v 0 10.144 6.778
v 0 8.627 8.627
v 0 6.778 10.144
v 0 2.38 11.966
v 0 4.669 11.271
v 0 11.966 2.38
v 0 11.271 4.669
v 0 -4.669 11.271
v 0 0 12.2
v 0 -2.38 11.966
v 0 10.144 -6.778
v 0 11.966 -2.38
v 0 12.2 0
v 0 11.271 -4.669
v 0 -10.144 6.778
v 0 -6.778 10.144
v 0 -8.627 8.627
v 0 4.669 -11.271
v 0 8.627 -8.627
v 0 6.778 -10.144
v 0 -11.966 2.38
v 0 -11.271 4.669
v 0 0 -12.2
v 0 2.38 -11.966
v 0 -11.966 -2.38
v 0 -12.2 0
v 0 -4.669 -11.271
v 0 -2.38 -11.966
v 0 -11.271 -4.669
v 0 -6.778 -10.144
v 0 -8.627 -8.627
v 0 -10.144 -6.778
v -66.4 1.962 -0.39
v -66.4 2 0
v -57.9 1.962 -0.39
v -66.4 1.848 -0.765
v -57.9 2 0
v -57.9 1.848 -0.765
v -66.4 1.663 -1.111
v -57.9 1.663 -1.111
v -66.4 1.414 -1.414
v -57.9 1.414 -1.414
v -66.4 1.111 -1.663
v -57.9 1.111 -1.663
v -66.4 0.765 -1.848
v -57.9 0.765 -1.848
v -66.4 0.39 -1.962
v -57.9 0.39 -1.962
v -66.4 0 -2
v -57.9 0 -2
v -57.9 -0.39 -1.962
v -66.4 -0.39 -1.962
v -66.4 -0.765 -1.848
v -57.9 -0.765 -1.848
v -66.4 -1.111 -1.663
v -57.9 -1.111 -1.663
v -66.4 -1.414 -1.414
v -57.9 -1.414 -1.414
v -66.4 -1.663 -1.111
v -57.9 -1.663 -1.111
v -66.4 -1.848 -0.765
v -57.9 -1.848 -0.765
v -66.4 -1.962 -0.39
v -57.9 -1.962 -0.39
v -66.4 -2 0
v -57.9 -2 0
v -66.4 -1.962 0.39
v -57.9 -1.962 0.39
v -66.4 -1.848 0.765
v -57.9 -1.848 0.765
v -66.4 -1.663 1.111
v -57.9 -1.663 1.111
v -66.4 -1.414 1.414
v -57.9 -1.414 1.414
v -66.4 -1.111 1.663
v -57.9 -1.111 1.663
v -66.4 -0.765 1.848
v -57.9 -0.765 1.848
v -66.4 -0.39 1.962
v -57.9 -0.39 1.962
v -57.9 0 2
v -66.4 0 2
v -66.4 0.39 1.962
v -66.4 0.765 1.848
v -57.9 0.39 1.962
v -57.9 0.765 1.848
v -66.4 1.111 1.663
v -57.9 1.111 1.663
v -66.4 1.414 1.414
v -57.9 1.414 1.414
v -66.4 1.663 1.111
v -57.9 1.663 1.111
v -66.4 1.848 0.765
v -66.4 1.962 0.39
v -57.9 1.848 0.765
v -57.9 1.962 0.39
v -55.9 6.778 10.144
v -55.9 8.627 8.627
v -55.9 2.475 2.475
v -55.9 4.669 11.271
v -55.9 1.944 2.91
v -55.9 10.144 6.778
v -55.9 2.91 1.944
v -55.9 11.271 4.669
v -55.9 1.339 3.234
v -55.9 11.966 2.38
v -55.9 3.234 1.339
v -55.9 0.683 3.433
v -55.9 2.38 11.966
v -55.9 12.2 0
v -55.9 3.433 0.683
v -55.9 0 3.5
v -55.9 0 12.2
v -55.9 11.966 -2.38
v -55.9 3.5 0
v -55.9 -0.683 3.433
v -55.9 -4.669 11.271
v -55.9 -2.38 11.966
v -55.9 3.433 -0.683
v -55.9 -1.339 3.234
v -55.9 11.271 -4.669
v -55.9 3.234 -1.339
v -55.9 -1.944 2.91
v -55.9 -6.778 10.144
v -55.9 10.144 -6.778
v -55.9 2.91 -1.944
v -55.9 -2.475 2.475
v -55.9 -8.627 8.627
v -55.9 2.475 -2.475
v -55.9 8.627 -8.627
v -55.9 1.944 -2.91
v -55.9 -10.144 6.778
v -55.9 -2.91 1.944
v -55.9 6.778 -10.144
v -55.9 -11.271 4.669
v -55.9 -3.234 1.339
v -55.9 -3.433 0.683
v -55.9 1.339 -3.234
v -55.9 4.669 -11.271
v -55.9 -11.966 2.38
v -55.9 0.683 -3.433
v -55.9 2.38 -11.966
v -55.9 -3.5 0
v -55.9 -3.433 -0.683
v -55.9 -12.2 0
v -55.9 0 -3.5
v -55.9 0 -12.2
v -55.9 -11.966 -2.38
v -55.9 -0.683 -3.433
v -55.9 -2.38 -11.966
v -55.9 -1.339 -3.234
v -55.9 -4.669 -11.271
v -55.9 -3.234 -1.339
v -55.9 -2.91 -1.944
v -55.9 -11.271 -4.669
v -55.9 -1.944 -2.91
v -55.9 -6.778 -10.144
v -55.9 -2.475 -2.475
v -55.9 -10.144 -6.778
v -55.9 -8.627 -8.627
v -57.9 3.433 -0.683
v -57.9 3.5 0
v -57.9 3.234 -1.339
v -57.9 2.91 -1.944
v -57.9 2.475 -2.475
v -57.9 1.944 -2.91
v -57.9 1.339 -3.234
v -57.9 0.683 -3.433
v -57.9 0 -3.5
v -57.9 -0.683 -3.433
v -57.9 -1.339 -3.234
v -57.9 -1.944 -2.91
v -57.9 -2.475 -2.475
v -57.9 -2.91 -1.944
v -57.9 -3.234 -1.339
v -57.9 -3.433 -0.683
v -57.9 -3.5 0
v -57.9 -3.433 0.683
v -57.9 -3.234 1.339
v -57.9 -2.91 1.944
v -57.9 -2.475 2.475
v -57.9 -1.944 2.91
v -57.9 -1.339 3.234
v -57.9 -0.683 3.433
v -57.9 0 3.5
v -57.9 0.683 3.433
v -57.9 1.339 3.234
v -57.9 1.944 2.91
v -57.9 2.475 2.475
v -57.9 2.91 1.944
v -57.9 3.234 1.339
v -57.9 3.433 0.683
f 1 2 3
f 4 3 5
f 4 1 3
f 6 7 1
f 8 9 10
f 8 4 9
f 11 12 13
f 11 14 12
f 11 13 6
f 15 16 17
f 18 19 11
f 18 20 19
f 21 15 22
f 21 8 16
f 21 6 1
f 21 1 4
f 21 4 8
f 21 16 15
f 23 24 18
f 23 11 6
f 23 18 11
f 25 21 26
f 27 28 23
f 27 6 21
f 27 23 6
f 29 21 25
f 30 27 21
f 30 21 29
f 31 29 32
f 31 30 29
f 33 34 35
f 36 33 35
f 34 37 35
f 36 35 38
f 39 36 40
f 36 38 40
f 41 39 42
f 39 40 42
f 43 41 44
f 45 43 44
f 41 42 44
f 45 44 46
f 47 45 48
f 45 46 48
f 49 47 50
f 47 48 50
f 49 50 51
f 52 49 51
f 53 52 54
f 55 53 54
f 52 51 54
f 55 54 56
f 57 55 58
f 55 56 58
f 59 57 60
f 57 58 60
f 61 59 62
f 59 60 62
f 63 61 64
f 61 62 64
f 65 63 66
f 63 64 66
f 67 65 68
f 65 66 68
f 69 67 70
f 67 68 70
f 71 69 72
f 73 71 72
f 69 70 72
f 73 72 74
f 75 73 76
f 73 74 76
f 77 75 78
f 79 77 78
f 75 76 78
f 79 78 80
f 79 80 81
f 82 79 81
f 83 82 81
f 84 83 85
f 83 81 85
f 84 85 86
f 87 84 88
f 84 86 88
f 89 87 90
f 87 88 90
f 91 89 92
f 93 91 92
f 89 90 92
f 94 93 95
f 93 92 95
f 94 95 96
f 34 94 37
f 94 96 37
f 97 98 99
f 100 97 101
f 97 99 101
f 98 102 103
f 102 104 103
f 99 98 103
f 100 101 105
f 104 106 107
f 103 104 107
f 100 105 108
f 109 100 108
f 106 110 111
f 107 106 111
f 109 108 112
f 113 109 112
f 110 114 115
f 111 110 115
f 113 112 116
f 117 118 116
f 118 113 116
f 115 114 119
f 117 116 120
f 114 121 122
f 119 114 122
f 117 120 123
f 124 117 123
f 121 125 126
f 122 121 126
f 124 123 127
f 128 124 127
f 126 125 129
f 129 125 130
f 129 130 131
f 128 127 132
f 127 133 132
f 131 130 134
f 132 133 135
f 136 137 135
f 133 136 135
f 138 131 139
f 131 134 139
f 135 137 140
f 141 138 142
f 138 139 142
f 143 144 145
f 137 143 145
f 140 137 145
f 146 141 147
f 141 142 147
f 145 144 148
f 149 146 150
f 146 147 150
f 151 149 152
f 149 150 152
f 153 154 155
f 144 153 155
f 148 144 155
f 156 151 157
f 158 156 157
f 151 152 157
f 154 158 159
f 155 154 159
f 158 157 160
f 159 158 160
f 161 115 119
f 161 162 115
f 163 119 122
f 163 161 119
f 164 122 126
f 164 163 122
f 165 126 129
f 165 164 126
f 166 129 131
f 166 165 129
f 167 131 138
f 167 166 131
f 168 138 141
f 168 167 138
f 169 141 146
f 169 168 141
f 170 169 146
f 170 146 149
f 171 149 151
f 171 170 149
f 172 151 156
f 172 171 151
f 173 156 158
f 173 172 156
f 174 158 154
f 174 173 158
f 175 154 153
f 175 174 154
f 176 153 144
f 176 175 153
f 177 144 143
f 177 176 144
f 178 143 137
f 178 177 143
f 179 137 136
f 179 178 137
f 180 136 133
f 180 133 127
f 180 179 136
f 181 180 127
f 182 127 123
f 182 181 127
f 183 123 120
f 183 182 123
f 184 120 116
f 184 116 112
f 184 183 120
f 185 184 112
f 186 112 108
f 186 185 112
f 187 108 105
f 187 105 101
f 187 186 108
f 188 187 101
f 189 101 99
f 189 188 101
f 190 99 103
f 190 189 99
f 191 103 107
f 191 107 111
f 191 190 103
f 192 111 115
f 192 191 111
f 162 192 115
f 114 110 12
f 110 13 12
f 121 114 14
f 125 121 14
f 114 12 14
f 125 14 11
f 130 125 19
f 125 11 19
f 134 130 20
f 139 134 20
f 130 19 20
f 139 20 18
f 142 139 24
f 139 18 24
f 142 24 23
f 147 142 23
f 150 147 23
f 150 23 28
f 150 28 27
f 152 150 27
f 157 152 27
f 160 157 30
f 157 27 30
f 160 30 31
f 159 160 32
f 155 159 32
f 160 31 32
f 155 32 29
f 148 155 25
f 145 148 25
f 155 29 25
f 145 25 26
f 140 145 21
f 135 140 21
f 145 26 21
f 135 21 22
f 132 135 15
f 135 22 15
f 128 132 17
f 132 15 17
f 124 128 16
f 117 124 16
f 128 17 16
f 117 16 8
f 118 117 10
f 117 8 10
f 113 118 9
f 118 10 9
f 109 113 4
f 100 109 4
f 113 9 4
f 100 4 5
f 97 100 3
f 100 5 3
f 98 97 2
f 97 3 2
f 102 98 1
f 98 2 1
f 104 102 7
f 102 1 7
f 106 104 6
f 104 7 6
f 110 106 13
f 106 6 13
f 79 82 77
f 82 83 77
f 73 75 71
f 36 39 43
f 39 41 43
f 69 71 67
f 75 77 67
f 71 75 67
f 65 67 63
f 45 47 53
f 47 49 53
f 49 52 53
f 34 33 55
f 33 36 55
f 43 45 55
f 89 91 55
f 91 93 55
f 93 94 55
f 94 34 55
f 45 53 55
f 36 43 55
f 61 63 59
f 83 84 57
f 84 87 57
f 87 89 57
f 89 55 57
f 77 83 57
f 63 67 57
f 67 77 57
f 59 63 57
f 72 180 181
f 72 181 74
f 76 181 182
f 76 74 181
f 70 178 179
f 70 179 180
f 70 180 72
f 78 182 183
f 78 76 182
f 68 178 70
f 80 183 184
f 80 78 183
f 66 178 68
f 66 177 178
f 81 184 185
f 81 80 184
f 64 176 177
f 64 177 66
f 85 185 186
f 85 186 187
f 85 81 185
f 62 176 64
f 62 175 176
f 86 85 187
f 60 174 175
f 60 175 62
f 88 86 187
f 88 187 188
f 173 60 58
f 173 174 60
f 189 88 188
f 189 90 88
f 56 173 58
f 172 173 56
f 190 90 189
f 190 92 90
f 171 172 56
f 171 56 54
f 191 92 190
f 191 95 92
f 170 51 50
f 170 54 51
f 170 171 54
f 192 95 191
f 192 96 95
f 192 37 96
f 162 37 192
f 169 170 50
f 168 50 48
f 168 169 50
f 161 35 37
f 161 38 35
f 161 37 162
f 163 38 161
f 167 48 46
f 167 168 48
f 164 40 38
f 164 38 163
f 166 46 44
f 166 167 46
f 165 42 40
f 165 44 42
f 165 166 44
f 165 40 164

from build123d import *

# Parameters (mm, degrees)
SKICA2_W   = 8.5
SKICA2_H   = 2
SKICA2_W_2 = 55.9
SKICA2_H_2 = 12.2


with BuildPart() as part:
    # Skica2 → Rotovat1 (revolve)
    with BuildSketch(Plane.XY):
        with Locations((-62.15, 1)):
            Rectangle(SKICA2_W, SKICA2_H)
        Polygon((-57.9, 0), (-55.9, 0), (-55.9, 3.5), (-57.9, 3.5), (-57.9, 2), align=None)
        with Locations((-27.95, 6.1)):
            Rectangle(SKICA2_W_2, SKICA2_H_2)
    revolve(axis=Axis((0, 0, 0), (-1, 0, 0)))


solid = part.part
